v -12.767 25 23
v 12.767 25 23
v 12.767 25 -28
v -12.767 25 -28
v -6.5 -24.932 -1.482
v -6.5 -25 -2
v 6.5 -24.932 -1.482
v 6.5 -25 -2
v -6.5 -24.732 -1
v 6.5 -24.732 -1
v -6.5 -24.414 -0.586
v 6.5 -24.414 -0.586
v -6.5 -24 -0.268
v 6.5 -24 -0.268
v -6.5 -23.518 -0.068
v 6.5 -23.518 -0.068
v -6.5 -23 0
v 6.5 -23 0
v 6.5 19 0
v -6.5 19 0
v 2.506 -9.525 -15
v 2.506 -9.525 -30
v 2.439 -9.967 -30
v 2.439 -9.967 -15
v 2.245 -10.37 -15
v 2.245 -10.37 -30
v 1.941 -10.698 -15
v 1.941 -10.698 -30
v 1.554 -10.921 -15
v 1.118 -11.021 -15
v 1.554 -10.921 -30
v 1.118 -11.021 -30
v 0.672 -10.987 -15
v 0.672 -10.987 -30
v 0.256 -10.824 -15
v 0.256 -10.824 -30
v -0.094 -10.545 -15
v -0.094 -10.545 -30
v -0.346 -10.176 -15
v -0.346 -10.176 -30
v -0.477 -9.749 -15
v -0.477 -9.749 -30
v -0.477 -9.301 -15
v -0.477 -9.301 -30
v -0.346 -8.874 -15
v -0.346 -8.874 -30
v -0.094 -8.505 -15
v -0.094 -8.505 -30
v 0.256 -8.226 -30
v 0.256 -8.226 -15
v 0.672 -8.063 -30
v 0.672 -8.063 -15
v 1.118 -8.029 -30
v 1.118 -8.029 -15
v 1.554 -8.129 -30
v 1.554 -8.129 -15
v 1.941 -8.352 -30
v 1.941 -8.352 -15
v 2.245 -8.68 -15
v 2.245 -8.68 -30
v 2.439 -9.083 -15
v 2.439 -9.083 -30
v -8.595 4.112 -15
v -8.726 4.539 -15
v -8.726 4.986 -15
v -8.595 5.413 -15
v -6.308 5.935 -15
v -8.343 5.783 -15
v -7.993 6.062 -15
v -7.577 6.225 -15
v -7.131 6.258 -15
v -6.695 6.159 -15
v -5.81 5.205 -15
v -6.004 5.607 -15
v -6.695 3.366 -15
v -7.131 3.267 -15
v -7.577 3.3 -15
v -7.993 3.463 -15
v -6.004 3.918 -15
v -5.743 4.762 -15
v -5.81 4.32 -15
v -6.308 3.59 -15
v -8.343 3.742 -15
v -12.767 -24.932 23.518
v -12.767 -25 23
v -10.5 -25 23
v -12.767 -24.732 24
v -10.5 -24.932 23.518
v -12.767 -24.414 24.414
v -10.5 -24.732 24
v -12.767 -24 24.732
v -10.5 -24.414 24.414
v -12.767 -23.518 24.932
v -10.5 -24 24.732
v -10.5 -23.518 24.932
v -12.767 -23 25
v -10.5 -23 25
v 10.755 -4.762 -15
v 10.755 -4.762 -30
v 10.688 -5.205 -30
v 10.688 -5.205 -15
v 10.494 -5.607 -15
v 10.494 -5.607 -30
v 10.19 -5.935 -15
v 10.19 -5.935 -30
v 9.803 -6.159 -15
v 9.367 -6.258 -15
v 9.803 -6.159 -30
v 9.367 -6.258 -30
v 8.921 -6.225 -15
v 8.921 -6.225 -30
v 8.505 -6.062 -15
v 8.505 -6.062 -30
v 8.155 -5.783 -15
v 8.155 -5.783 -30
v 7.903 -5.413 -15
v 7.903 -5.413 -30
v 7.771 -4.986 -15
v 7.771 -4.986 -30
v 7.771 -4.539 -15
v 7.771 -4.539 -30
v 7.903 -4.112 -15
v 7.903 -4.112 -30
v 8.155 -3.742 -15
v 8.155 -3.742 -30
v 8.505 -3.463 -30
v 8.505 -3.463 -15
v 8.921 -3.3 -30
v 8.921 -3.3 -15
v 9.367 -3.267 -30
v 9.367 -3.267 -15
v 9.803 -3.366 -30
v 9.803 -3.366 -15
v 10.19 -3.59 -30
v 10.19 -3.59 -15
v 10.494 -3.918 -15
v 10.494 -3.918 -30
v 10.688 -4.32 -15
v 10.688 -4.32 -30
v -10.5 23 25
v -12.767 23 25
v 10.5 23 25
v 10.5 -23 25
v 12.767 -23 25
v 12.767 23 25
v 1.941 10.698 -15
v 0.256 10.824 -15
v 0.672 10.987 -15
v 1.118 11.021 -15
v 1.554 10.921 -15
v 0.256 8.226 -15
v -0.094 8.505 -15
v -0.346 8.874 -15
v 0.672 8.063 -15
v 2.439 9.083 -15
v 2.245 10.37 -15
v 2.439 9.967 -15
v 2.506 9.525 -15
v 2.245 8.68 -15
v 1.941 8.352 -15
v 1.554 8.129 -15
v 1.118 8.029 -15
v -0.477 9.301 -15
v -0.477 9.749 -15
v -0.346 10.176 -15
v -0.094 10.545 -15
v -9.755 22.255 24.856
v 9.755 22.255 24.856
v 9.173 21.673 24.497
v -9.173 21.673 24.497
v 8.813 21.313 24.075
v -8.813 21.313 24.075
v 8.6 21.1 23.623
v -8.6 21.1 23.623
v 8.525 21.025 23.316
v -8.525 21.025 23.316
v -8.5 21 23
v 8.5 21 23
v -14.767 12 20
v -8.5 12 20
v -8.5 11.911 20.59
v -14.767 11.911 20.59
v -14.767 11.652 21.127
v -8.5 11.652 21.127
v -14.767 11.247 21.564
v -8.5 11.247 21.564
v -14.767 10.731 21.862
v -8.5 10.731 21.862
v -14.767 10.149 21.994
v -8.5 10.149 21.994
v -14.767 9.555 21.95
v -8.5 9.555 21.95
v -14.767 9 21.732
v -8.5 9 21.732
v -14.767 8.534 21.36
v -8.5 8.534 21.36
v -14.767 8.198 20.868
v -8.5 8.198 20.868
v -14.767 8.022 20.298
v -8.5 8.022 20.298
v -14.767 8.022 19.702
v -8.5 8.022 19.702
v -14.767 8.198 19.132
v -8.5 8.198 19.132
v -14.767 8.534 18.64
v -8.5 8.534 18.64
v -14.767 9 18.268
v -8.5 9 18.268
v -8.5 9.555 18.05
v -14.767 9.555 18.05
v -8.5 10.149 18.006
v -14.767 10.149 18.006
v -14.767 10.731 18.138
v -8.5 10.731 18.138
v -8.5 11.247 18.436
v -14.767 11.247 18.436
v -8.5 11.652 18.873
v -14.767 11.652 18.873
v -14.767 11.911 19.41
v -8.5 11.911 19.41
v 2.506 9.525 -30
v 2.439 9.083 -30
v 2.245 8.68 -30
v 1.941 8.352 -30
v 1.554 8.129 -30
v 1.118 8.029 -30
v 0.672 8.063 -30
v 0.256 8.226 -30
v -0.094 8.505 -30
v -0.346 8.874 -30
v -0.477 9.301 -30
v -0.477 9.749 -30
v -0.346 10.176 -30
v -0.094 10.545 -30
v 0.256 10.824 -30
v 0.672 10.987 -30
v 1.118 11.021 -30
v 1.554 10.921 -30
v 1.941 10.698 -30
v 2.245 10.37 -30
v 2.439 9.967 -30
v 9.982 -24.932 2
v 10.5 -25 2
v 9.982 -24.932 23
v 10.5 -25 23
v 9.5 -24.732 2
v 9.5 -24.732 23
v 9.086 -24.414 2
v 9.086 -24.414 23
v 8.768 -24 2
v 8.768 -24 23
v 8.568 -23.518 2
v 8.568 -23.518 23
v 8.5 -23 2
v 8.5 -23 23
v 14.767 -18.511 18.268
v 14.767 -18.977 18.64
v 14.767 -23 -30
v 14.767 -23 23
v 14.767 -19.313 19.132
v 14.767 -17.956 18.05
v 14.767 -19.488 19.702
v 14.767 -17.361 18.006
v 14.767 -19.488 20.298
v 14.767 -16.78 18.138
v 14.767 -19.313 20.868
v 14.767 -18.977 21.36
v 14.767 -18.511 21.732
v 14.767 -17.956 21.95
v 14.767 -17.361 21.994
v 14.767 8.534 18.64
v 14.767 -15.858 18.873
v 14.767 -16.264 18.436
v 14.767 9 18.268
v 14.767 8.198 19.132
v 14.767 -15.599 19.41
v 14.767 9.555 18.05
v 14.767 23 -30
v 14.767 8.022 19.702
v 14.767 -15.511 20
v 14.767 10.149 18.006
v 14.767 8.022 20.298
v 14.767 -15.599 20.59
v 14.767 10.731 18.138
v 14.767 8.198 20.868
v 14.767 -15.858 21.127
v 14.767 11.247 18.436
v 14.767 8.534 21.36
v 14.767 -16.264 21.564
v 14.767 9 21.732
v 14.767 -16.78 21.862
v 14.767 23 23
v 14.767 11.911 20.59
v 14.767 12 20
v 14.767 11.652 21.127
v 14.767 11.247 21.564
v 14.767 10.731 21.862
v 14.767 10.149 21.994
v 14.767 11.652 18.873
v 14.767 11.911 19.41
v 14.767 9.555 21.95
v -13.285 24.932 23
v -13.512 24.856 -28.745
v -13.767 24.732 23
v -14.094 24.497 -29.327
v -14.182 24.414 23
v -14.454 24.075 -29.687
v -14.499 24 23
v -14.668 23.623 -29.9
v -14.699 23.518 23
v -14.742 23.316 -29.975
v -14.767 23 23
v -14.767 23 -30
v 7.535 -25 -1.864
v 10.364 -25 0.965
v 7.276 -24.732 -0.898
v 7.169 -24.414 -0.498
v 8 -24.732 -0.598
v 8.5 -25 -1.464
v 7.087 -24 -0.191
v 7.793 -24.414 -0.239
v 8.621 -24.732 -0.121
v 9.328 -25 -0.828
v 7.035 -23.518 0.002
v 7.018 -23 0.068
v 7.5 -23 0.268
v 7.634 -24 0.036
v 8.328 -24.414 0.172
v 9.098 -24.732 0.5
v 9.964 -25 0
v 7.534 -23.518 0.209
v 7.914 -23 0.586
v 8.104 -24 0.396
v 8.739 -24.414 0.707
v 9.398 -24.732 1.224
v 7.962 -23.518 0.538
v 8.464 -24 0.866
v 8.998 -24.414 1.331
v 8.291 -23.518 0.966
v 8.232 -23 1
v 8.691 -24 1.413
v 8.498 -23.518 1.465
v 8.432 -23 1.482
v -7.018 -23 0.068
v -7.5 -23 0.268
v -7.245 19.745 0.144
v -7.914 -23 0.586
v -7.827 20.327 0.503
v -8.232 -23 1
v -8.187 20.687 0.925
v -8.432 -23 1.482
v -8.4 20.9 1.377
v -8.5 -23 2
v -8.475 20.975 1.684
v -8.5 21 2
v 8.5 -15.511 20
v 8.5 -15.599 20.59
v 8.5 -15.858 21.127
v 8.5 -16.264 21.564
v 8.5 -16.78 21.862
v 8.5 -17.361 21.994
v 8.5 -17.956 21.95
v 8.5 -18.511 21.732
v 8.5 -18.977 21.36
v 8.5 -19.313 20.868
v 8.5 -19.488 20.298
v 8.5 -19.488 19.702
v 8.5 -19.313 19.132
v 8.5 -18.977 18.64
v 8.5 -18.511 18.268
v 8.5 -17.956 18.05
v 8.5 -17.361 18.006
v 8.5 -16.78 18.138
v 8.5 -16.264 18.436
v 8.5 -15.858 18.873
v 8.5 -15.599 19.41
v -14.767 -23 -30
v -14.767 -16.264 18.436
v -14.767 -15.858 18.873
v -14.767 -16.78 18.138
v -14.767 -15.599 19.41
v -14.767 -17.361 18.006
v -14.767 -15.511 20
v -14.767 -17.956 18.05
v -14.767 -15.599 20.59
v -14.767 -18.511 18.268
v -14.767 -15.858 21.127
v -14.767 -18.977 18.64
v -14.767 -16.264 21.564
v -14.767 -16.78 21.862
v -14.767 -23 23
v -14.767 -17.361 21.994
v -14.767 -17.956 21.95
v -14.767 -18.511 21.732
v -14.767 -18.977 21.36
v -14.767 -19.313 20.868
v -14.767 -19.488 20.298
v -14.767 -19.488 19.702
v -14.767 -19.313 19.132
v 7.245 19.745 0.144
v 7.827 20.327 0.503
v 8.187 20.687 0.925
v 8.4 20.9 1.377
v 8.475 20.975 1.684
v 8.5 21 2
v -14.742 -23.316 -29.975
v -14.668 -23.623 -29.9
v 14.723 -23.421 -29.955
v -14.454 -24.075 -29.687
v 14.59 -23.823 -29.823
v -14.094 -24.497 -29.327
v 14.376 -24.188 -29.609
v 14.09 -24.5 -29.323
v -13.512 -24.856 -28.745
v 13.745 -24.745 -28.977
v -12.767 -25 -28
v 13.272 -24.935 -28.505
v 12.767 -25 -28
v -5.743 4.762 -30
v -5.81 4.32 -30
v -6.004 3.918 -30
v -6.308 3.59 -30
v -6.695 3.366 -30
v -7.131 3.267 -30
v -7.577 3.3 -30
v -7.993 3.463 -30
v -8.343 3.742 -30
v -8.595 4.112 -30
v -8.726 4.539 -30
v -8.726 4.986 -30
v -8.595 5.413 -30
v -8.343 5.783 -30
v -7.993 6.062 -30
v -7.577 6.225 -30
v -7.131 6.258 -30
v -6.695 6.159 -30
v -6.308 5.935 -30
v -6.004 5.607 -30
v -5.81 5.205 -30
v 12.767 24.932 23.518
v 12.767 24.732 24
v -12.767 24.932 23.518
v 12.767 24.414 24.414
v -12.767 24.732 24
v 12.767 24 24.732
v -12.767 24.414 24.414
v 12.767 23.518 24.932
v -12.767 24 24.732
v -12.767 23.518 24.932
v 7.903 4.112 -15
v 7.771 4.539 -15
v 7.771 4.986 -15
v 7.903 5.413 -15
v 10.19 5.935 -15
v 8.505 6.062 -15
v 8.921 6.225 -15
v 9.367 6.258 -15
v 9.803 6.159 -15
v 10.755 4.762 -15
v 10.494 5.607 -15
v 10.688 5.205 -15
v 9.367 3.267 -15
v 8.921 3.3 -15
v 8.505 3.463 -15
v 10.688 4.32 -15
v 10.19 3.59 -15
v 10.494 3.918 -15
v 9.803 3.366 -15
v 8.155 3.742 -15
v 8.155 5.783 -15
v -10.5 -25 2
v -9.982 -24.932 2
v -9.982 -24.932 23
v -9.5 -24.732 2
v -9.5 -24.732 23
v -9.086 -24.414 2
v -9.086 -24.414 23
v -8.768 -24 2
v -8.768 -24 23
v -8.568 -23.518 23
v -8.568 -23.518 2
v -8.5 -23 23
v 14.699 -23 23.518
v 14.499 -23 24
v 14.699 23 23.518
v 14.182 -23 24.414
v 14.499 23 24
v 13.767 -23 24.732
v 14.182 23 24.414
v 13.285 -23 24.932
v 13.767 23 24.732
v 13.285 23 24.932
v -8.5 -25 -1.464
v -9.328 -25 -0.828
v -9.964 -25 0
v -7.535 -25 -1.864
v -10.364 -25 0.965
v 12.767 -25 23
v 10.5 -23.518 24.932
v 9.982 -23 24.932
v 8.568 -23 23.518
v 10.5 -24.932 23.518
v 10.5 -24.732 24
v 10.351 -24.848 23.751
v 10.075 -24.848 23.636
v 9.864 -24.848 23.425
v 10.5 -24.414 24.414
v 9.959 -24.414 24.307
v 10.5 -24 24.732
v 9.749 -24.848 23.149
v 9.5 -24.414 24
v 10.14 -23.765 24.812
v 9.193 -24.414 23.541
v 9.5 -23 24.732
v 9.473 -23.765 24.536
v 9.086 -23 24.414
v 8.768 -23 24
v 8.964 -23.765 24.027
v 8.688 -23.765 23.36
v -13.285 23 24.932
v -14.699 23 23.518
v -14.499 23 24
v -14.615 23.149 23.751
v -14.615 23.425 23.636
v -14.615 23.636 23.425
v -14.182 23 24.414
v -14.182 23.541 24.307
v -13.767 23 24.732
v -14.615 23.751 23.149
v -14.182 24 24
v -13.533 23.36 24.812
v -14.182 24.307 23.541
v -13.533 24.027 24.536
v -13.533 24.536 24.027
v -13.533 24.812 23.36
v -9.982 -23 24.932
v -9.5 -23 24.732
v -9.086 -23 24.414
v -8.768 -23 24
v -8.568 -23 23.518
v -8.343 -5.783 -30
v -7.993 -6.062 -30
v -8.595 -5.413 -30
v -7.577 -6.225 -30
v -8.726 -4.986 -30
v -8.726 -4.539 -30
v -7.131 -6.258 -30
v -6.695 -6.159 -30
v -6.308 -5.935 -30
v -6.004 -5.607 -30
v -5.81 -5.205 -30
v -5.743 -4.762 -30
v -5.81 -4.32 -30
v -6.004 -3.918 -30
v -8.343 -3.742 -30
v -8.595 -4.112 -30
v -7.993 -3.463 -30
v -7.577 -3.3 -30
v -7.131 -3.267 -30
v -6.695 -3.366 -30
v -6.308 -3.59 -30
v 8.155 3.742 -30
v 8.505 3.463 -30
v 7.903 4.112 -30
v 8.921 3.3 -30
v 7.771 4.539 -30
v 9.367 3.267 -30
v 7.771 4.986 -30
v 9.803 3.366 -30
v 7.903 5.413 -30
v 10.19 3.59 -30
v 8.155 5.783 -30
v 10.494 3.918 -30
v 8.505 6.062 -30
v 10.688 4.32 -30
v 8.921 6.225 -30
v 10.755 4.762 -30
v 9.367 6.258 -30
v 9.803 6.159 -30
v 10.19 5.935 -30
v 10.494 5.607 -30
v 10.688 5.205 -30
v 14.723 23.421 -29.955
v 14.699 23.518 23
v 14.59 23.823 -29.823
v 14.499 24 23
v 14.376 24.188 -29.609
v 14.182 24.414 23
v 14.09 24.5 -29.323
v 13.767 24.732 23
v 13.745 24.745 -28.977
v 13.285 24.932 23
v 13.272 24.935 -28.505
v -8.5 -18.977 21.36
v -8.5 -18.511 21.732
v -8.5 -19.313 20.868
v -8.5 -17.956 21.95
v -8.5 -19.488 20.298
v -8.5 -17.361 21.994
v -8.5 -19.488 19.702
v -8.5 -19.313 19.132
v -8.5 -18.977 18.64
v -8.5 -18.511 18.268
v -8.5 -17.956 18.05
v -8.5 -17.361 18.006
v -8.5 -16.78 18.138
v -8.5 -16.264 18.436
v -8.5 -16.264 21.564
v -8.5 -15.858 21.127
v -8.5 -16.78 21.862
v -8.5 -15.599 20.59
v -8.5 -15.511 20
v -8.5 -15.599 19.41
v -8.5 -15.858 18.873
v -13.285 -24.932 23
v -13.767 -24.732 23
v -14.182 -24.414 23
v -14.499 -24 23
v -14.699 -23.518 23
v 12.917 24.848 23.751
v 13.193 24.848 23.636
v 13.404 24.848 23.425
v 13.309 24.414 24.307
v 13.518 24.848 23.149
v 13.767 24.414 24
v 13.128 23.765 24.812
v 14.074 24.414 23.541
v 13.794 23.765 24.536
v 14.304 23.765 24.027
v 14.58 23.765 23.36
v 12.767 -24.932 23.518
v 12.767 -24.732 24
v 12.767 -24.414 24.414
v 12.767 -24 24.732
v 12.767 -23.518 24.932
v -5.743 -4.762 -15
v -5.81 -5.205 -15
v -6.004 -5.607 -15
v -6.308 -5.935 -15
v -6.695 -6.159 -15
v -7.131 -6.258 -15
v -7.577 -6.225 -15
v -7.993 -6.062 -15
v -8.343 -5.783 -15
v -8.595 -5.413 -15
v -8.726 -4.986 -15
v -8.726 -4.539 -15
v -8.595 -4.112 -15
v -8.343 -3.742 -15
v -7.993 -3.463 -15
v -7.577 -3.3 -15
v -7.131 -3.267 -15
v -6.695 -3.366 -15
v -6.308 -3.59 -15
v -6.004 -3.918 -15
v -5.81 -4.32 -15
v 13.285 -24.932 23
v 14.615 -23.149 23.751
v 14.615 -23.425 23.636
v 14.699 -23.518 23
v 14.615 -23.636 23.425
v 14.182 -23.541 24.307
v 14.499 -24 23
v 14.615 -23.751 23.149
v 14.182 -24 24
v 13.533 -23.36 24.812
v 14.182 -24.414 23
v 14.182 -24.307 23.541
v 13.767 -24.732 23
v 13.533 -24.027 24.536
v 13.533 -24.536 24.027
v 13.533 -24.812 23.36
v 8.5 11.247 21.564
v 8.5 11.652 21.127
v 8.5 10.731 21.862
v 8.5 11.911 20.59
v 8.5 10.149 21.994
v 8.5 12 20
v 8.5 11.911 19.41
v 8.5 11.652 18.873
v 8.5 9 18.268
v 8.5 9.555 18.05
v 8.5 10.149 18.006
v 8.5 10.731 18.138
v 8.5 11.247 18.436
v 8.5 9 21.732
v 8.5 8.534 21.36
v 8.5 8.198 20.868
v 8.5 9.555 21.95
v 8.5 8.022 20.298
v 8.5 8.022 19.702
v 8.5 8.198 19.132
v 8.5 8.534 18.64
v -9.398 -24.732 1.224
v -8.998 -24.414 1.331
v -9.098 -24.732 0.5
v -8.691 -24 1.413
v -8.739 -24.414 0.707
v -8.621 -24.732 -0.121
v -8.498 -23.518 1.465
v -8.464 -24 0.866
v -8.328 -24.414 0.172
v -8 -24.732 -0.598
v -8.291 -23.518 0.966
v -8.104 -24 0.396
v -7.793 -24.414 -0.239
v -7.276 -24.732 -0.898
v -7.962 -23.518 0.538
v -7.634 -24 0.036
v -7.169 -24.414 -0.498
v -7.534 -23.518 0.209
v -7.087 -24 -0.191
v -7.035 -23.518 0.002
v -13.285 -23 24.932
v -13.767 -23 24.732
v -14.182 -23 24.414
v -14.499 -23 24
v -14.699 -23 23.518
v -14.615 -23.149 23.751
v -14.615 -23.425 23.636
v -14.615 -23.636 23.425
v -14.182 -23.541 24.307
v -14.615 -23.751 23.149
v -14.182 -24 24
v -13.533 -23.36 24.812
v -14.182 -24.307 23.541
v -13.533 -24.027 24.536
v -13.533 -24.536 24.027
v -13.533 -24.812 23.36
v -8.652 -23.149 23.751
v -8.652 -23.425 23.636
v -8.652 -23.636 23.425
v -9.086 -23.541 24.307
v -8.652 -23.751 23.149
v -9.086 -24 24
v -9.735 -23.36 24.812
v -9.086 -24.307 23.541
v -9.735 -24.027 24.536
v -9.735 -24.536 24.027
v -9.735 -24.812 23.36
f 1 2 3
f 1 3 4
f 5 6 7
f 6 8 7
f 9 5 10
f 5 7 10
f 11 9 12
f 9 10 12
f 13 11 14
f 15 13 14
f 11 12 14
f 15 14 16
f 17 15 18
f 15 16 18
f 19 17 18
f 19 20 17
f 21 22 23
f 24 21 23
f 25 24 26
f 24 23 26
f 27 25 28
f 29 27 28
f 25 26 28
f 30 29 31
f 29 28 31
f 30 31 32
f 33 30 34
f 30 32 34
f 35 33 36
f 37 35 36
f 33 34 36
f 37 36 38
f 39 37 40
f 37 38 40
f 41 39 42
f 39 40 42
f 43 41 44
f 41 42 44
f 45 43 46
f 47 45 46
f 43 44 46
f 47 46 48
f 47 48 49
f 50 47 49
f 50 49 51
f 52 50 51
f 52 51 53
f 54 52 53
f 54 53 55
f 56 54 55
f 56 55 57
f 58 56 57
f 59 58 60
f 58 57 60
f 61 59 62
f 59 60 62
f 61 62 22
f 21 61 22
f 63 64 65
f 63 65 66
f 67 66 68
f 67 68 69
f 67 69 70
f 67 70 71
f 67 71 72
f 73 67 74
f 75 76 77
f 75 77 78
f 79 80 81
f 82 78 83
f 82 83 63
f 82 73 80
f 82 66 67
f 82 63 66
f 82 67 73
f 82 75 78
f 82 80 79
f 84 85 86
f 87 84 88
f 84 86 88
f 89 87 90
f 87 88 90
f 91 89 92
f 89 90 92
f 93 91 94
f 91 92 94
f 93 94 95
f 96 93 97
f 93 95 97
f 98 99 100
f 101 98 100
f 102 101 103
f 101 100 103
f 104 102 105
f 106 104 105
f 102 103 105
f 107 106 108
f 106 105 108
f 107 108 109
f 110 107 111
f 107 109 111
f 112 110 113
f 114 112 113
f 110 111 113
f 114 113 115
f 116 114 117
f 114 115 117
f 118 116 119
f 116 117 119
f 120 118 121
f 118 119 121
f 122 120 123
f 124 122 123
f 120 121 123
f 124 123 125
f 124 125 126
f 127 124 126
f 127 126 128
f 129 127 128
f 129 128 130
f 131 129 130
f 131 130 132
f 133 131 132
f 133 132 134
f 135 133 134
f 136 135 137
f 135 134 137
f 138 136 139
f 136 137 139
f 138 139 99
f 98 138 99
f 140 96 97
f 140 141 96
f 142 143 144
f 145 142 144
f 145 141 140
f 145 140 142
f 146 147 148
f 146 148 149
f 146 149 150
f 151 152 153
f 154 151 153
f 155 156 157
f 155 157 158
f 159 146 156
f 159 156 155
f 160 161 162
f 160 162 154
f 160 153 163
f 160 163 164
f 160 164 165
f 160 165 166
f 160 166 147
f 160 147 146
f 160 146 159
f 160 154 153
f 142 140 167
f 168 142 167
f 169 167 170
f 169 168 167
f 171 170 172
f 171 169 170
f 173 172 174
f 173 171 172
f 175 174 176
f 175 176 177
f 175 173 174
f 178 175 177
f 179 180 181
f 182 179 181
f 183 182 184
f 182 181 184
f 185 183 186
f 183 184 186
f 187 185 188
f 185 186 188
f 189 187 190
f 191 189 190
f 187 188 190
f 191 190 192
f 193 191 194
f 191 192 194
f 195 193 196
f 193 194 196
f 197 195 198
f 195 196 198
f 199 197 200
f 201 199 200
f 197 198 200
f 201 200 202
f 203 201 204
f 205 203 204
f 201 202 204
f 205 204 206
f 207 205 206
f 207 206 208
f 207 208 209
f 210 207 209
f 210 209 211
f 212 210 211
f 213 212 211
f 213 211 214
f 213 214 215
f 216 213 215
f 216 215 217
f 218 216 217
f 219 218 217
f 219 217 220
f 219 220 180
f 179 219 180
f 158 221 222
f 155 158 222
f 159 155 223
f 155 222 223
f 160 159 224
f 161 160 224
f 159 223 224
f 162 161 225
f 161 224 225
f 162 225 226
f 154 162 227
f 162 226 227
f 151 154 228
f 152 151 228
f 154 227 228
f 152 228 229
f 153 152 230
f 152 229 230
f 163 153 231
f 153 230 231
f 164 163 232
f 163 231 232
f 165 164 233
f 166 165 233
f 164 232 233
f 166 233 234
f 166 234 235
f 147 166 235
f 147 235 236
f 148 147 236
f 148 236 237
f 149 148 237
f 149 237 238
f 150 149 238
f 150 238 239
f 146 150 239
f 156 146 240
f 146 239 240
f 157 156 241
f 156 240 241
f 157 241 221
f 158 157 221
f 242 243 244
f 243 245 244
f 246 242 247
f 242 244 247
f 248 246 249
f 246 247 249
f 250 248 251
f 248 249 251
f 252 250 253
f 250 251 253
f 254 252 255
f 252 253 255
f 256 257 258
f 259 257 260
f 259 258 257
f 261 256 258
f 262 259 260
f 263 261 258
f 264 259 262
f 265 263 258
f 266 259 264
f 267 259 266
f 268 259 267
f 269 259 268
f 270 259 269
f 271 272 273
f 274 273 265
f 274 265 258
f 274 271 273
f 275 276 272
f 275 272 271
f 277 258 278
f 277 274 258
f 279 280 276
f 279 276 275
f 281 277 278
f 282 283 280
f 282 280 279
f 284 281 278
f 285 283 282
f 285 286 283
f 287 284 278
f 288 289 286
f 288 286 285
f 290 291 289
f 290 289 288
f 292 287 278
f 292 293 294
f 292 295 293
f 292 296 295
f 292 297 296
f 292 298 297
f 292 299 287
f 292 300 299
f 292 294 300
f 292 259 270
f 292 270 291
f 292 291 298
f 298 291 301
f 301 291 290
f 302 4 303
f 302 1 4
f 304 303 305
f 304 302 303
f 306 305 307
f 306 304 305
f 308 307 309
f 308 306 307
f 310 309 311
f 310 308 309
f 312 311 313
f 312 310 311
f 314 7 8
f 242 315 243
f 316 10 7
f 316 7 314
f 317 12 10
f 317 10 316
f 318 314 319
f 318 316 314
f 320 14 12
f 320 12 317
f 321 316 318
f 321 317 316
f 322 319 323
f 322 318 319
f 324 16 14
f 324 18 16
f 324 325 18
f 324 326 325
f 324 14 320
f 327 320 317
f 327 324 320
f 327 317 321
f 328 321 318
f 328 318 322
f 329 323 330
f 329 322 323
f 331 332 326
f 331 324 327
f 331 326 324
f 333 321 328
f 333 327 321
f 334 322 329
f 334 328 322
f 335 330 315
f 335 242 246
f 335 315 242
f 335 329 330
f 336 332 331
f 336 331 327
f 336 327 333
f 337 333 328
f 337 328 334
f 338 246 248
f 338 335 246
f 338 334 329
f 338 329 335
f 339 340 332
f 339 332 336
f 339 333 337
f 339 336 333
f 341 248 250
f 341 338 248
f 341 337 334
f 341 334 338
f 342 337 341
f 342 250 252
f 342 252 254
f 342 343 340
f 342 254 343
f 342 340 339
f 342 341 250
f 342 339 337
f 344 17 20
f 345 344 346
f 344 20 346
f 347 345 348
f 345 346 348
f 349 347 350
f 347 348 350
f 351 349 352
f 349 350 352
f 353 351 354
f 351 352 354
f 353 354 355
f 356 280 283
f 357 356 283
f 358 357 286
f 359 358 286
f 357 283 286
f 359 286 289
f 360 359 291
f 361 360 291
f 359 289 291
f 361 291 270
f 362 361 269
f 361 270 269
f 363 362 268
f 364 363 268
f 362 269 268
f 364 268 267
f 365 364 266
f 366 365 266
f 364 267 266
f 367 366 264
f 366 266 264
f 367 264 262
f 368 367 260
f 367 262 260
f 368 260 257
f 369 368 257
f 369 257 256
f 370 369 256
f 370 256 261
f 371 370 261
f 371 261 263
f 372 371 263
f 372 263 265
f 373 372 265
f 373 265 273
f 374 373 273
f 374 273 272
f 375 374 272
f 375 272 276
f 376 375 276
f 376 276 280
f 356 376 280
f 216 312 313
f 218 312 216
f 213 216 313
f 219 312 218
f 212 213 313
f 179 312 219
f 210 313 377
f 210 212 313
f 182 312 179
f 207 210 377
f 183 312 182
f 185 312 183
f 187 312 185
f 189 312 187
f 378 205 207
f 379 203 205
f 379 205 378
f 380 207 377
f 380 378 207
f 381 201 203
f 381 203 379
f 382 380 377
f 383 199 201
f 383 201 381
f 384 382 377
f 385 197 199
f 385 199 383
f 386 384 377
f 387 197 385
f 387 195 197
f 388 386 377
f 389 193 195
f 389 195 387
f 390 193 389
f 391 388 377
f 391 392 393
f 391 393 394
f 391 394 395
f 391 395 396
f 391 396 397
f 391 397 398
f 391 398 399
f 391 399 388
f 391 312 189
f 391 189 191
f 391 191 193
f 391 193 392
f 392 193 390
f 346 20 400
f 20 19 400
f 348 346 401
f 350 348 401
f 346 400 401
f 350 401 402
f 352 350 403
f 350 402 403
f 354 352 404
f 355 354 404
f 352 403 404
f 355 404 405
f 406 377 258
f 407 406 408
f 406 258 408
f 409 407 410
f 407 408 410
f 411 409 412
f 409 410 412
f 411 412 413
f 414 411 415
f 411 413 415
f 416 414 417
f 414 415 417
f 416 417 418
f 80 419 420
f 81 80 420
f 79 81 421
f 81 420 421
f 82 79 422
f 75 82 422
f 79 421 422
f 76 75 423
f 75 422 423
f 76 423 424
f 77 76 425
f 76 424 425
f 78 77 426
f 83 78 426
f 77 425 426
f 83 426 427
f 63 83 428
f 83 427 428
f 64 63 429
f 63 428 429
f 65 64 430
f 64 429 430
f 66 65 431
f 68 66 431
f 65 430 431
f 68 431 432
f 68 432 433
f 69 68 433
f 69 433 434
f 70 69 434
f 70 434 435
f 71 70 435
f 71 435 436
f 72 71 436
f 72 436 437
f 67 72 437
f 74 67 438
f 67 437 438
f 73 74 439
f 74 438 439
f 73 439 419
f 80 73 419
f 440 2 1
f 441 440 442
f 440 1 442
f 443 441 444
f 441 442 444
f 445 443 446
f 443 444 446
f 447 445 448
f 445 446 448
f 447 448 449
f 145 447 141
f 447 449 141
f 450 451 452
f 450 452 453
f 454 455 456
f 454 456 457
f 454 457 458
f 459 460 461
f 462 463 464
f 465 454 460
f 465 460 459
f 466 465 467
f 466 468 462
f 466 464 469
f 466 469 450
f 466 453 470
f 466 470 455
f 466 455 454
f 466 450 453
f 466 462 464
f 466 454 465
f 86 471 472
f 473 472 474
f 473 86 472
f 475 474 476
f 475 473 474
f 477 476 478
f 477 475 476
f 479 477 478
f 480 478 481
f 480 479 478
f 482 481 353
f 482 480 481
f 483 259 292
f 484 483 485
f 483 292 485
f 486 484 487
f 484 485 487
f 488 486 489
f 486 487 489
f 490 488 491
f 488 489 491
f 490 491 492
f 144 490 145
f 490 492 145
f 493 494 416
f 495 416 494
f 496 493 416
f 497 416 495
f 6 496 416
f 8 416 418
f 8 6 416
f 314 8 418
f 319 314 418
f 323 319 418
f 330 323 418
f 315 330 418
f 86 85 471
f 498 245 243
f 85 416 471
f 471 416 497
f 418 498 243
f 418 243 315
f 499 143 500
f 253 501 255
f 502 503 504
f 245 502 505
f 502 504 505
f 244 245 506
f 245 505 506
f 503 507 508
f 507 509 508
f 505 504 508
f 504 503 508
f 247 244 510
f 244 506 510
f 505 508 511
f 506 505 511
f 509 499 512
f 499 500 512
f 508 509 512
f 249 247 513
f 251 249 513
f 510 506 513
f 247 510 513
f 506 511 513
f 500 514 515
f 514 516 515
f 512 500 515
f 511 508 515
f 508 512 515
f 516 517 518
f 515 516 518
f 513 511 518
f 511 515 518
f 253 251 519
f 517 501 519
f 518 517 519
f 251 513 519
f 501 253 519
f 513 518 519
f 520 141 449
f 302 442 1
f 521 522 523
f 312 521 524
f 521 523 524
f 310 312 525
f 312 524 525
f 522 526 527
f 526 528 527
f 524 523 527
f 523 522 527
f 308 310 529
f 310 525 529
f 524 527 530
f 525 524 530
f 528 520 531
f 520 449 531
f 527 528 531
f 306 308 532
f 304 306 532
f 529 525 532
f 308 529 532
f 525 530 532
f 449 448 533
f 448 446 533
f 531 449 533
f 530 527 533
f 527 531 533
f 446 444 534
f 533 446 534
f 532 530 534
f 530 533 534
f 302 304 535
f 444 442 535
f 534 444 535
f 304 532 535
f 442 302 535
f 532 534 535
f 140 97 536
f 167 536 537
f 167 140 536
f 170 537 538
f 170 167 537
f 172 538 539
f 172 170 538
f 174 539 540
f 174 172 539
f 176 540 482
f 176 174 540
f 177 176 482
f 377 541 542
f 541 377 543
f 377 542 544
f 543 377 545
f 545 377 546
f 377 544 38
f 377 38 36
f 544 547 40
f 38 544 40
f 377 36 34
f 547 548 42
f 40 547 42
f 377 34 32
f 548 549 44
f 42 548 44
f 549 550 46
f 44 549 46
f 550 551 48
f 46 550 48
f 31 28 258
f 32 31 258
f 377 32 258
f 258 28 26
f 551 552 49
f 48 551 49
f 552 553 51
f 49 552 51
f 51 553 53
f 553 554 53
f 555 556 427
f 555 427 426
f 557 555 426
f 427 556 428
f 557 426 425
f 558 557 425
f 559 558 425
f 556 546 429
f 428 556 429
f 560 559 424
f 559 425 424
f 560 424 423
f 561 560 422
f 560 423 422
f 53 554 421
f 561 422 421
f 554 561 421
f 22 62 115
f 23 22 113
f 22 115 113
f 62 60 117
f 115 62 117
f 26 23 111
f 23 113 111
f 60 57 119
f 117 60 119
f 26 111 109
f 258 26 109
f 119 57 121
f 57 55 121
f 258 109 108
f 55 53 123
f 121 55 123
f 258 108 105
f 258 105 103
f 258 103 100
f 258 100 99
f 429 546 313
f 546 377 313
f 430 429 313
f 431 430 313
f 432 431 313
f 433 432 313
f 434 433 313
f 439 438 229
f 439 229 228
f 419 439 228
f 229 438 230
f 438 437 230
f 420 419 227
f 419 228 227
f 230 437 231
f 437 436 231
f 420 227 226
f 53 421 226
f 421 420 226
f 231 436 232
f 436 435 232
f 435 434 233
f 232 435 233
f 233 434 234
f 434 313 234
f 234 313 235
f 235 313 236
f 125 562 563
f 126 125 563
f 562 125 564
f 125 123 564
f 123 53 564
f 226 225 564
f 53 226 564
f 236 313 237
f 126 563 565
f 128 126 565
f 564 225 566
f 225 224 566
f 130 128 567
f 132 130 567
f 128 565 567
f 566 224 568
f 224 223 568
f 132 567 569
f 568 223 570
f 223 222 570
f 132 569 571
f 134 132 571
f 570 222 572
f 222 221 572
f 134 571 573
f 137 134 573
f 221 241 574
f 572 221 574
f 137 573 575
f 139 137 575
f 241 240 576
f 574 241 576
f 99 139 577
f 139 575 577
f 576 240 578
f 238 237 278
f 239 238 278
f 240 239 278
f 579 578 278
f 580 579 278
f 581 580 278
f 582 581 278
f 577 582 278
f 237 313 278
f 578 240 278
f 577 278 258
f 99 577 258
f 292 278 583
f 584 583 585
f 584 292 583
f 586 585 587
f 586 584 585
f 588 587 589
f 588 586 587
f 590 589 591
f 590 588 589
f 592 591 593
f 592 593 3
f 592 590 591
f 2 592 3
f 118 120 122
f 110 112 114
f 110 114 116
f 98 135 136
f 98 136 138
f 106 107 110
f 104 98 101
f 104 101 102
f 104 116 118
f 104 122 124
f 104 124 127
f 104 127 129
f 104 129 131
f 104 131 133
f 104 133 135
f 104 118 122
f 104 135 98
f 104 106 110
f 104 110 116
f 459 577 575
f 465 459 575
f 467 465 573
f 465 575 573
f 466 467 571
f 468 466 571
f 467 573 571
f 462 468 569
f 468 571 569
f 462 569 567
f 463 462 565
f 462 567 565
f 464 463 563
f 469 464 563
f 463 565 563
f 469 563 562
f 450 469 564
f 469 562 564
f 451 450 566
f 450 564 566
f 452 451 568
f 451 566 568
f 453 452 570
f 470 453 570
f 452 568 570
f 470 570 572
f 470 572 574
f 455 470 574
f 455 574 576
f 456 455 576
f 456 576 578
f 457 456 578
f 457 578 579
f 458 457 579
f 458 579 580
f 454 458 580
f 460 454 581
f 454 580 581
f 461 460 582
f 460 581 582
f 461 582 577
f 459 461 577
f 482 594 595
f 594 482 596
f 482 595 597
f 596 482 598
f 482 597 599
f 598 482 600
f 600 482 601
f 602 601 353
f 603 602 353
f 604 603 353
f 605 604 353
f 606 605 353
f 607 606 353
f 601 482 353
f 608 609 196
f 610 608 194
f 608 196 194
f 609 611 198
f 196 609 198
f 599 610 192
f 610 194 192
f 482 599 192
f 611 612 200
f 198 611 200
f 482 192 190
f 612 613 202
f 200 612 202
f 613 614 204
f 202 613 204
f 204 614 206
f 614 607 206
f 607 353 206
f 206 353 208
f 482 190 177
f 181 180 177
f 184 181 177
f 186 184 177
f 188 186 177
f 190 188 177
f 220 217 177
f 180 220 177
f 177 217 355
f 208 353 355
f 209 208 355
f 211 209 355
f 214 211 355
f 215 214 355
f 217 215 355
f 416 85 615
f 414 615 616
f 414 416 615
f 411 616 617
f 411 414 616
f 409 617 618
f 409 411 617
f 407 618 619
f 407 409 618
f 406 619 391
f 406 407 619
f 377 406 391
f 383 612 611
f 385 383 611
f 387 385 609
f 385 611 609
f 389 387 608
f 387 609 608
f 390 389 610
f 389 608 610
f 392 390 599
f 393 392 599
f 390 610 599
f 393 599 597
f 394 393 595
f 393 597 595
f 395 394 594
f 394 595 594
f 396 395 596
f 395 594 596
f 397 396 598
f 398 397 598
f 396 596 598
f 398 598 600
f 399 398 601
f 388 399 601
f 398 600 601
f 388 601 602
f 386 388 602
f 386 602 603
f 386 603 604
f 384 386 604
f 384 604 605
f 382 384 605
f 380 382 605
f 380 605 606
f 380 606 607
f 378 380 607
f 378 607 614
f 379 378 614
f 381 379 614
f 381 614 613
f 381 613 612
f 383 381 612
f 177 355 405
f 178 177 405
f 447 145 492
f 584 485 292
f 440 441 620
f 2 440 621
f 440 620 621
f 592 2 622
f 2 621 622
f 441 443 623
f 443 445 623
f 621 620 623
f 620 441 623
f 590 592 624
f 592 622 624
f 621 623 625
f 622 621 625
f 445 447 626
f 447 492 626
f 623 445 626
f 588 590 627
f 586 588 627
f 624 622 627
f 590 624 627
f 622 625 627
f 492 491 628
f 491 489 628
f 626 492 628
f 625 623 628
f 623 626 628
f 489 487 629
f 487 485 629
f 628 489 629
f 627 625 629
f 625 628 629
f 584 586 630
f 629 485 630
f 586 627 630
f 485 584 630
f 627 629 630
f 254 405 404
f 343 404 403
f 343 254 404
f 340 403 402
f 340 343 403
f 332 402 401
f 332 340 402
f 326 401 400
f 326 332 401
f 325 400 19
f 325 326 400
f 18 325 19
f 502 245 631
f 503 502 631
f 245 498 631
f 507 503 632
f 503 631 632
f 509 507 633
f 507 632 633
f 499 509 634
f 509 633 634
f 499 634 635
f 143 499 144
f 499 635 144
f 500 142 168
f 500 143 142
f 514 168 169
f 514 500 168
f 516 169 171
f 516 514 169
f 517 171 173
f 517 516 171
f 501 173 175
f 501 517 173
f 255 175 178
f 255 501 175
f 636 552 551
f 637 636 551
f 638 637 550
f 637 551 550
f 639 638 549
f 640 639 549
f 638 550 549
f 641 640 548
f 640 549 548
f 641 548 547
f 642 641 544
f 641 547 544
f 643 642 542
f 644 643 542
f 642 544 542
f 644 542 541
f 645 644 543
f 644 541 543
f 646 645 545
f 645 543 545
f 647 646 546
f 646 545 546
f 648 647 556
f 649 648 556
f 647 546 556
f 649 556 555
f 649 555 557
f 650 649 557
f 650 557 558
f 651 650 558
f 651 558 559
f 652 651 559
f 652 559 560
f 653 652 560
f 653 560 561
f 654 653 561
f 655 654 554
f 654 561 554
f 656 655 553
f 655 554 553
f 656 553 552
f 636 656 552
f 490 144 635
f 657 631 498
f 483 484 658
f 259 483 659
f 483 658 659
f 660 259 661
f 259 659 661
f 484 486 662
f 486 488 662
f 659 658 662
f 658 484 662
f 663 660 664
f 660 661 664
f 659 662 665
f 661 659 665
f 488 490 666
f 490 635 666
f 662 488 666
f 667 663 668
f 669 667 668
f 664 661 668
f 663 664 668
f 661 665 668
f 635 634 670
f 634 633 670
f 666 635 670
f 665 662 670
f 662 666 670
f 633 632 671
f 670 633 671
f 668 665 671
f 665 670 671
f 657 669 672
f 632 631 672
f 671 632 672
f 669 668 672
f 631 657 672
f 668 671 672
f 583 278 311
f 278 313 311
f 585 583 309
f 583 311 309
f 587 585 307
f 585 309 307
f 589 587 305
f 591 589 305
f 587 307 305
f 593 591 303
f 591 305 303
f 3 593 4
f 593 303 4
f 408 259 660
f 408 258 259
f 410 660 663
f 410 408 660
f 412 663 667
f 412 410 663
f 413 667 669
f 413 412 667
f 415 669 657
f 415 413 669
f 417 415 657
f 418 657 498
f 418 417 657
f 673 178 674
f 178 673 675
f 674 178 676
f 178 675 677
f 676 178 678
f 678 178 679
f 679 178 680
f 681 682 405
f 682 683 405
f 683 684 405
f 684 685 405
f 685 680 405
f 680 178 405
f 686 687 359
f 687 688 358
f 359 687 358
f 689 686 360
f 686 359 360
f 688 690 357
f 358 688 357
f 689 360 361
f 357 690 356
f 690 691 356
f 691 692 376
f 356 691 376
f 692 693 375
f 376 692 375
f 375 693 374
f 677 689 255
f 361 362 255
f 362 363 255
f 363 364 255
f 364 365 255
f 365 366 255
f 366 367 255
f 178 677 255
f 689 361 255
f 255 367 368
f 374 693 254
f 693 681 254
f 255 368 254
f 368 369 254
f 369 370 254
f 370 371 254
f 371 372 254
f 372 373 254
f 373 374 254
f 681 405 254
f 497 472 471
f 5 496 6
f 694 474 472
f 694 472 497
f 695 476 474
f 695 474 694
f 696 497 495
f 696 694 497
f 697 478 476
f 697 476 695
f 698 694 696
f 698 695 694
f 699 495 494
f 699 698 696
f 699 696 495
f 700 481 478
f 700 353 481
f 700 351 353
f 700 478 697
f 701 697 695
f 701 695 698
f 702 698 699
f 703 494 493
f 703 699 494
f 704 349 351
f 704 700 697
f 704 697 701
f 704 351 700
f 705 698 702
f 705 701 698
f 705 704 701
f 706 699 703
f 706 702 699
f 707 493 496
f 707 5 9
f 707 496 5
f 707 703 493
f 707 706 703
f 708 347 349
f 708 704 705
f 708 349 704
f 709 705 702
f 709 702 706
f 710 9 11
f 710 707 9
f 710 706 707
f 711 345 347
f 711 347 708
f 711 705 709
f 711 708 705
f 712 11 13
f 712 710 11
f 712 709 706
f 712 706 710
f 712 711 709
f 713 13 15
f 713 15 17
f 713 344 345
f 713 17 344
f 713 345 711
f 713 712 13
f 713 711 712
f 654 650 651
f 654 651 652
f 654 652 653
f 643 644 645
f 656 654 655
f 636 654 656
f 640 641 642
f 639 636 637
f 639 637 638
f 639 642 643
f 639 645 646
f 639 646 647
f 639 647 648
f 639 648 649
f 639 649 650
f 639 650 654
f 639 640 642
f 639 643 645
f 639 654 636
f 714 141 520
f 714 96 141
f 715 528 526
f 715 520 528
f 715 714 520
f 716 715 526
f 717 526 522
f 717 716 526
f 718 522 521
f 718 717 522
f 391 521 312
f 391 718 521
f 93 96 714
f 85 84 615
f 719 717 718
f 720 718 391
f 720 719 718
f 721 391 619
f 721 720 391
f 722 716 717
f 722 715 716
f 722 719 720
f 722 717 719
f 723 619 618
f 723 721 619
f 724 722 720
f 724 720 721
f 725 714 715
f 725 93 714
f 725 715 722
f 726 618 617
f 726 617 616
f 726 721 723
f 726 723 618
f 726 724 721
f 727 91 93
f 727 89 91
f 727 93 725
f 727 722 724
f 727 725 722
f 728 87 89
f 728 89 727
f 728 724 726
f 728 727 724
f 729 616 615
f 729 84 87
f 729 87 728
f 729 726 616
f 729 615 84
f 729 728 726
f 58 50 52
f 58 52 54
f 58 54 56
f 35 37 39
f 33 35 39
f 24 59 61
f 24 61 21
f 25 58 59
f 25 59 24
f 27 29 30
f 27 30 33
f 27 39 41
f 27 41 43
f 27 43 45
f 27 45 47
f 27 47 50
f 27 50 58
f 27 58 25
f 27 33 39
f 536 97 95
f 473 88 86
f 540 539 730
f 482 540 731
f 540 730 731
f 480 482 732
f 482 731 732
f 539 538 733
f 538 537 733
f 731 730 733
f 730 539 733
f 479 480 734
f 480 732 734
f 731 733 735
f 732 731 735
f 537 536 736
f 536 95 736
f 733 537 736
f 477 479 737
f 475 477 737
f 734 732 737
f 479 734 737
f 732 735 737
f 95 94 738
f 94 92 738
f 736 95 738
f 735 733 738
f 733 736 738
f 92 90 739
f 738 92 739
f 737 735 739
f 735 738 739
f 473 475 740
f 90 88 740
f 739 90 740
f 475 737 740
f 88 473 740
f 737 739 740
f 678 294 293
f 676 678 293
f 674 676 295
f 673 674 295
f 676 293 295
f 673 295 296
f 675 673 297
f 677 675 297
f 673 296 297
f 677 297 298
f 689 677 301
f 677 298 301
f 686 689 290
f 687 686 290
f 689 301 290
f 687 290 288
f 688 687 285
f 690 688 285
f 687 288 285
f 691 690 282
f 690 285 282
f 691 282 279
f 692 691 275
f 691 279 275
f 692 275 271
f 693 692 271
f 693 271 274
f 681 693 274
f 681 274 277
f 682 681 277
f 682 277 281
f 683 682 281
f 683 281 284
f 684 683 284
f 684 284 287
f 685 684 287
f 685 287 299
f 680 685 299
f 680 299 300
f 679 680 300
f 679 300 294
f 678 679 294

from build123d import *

# Parameters (mm, degrees)
F1_DEPTH  = 25
F2_DEPTH  = 5
F3_DEPTH  = 25
F4_R      = 2
F5_DEPTH  = 29.5357977842
F6_R      = 2
F7_DEPTH  = 29.5357977842
F8_R      = 1.99999
F9_R      = 1.5
F10_DEPTH = 15


# Not quite as in the source:
# - a fillet or chamfer is up to 0.001 mm smaller than in the source, because OpenCascade refuses the exact size
# - a feature names something its author has since deleted; it is built from what else it names


with BuildPart() as f1:
    # F0 (on Top) → F1 (new body)
    with BuildSketch(Plane.XY):
        Polygon((-8.5, -23.510635891), (-8.5, 0), (-8.5, 21), (8.5, 21), (8.5, 0), (8.5, -23.510635891), (8.5, -25), (14.7673988921, -25), (14.7673988921, -20.1723555878), (14.7673988921, -13.510635891), (14.7673988921, 25), (-14.7673988921, 25), (-14.7673988921, -20.1723555878), (-14.7673988921, -25), (-8.5, -25), align=None)
    extrude(amount=F1_DEPTH)

    # F0 (on Top) → F2 (join)
    with BuildSketch(Plane.XY):
        Polygon((-8.5, 21), (-8.5, 0), (-8.5, -23.510635891), (-8.5, -25), (8.5, -25), (8.5, -23.510635891), (8.5, 0), (8.5, 21), align=None)
        Polygon((-8.5, -23.510635891), (-8.5, 0), (-8.5, 21), (8.5, 21), (8.5, 0), (8.5, -23.510635891), (8.5, -25), (14.7673988921, -25), (14.7673988921, -20.1723555878), (14.7673988921, -13.510635891), (14.7673988921, 25), (-14.7673988921, 25), (-14.7673988921, -20.1723555878), (-14.7673988921, -25), (-8.5, -25), align=None)
    extrude(amount=-F2_DEPTH)

    # F3 (add): a face of the model
    f3_faces = [f1.faces().sort_by_distance(p)[0] for p in [
        (0, 0, -5),
    ]]
    extrude(f3_faces, amount=F3_DEPTH)

    # F4 (on face) → F5 (cut, through all)
    with BuildSketch(Plane.YZ.offset(14.7673988921)):
        with Locations((10, 20)):
            Circle(F4_R)
    extrude(amount=-F5_DEPTH, mode=Mode.SUBTRACT)

    # F6 (on face) → F7 (cut, through all)
    with BuildSketch(Plane.YZ.offset(14.7673988921)):
        with Locations((-17.510635891, 20)):
            Circle(F6_R)
    extrude(amount=-F7_DEPTH, mode=Mode.SUBTRACT)

    # F8 (radius 2 in the source; OpenCascade refuses exactly that, so slightly less here)
    f8_edges = [f1.edges().sort_by_distance(p)[0] for p in [
        (-11.633699, -25, 25),
        (-8.5, -2, 25),
        (0, 21, 25),
        (8.5, -2, 25),
        (11.633699, -25, 25),
        (14.767399, 0, 25),
        (0, 25, 25),
        (-14.767399, 0, 25),
        (-14.767399, 25, -2.5),
        (0, 25, -30),
        (14.767399, 25, -2.5),
        (-14.767399, -25, -2.5),
        (-8.5, -25, 12.5),
        (0, -25, 0),
        (8.5, -25, 12.5),
        (14.767399, -25, -2.5),
        (0, -25, -30),
        (-8.5, -2, 0),
        (0, 21, 0),
        (8.5, -2, 0),
    ]]
    fillet(f8_edges, radius=F8_R)

    # F9 (on face) → F10 (cut)
    with BuildSketch(Plane(origin=(0, 0, -30), x_dir=(1, 0, 0), z_dir=(0, 0, -1))):
        with Locations((9.2546826823, -4.7625)):
            Circle(F9_R)
        with Locations((1.0057907112, -9.525)):
            Circle(F9_R)
        with Locations((-7.2431012598, -4.7625)):
            Circle(F9_R)
        with Locations((-7.2431012598, 4.7625)):
            Circle(F9_R)
        with Locations((1.0057907112, 9.525)):
            Circle(F9_R)
        with Locations((9.2546826823, 4.7625)):
            Circle(F9_R)
    extrude(amount=-F10_DEPTH, mode=Mode.SUBTRACT)


solid = f1.part
